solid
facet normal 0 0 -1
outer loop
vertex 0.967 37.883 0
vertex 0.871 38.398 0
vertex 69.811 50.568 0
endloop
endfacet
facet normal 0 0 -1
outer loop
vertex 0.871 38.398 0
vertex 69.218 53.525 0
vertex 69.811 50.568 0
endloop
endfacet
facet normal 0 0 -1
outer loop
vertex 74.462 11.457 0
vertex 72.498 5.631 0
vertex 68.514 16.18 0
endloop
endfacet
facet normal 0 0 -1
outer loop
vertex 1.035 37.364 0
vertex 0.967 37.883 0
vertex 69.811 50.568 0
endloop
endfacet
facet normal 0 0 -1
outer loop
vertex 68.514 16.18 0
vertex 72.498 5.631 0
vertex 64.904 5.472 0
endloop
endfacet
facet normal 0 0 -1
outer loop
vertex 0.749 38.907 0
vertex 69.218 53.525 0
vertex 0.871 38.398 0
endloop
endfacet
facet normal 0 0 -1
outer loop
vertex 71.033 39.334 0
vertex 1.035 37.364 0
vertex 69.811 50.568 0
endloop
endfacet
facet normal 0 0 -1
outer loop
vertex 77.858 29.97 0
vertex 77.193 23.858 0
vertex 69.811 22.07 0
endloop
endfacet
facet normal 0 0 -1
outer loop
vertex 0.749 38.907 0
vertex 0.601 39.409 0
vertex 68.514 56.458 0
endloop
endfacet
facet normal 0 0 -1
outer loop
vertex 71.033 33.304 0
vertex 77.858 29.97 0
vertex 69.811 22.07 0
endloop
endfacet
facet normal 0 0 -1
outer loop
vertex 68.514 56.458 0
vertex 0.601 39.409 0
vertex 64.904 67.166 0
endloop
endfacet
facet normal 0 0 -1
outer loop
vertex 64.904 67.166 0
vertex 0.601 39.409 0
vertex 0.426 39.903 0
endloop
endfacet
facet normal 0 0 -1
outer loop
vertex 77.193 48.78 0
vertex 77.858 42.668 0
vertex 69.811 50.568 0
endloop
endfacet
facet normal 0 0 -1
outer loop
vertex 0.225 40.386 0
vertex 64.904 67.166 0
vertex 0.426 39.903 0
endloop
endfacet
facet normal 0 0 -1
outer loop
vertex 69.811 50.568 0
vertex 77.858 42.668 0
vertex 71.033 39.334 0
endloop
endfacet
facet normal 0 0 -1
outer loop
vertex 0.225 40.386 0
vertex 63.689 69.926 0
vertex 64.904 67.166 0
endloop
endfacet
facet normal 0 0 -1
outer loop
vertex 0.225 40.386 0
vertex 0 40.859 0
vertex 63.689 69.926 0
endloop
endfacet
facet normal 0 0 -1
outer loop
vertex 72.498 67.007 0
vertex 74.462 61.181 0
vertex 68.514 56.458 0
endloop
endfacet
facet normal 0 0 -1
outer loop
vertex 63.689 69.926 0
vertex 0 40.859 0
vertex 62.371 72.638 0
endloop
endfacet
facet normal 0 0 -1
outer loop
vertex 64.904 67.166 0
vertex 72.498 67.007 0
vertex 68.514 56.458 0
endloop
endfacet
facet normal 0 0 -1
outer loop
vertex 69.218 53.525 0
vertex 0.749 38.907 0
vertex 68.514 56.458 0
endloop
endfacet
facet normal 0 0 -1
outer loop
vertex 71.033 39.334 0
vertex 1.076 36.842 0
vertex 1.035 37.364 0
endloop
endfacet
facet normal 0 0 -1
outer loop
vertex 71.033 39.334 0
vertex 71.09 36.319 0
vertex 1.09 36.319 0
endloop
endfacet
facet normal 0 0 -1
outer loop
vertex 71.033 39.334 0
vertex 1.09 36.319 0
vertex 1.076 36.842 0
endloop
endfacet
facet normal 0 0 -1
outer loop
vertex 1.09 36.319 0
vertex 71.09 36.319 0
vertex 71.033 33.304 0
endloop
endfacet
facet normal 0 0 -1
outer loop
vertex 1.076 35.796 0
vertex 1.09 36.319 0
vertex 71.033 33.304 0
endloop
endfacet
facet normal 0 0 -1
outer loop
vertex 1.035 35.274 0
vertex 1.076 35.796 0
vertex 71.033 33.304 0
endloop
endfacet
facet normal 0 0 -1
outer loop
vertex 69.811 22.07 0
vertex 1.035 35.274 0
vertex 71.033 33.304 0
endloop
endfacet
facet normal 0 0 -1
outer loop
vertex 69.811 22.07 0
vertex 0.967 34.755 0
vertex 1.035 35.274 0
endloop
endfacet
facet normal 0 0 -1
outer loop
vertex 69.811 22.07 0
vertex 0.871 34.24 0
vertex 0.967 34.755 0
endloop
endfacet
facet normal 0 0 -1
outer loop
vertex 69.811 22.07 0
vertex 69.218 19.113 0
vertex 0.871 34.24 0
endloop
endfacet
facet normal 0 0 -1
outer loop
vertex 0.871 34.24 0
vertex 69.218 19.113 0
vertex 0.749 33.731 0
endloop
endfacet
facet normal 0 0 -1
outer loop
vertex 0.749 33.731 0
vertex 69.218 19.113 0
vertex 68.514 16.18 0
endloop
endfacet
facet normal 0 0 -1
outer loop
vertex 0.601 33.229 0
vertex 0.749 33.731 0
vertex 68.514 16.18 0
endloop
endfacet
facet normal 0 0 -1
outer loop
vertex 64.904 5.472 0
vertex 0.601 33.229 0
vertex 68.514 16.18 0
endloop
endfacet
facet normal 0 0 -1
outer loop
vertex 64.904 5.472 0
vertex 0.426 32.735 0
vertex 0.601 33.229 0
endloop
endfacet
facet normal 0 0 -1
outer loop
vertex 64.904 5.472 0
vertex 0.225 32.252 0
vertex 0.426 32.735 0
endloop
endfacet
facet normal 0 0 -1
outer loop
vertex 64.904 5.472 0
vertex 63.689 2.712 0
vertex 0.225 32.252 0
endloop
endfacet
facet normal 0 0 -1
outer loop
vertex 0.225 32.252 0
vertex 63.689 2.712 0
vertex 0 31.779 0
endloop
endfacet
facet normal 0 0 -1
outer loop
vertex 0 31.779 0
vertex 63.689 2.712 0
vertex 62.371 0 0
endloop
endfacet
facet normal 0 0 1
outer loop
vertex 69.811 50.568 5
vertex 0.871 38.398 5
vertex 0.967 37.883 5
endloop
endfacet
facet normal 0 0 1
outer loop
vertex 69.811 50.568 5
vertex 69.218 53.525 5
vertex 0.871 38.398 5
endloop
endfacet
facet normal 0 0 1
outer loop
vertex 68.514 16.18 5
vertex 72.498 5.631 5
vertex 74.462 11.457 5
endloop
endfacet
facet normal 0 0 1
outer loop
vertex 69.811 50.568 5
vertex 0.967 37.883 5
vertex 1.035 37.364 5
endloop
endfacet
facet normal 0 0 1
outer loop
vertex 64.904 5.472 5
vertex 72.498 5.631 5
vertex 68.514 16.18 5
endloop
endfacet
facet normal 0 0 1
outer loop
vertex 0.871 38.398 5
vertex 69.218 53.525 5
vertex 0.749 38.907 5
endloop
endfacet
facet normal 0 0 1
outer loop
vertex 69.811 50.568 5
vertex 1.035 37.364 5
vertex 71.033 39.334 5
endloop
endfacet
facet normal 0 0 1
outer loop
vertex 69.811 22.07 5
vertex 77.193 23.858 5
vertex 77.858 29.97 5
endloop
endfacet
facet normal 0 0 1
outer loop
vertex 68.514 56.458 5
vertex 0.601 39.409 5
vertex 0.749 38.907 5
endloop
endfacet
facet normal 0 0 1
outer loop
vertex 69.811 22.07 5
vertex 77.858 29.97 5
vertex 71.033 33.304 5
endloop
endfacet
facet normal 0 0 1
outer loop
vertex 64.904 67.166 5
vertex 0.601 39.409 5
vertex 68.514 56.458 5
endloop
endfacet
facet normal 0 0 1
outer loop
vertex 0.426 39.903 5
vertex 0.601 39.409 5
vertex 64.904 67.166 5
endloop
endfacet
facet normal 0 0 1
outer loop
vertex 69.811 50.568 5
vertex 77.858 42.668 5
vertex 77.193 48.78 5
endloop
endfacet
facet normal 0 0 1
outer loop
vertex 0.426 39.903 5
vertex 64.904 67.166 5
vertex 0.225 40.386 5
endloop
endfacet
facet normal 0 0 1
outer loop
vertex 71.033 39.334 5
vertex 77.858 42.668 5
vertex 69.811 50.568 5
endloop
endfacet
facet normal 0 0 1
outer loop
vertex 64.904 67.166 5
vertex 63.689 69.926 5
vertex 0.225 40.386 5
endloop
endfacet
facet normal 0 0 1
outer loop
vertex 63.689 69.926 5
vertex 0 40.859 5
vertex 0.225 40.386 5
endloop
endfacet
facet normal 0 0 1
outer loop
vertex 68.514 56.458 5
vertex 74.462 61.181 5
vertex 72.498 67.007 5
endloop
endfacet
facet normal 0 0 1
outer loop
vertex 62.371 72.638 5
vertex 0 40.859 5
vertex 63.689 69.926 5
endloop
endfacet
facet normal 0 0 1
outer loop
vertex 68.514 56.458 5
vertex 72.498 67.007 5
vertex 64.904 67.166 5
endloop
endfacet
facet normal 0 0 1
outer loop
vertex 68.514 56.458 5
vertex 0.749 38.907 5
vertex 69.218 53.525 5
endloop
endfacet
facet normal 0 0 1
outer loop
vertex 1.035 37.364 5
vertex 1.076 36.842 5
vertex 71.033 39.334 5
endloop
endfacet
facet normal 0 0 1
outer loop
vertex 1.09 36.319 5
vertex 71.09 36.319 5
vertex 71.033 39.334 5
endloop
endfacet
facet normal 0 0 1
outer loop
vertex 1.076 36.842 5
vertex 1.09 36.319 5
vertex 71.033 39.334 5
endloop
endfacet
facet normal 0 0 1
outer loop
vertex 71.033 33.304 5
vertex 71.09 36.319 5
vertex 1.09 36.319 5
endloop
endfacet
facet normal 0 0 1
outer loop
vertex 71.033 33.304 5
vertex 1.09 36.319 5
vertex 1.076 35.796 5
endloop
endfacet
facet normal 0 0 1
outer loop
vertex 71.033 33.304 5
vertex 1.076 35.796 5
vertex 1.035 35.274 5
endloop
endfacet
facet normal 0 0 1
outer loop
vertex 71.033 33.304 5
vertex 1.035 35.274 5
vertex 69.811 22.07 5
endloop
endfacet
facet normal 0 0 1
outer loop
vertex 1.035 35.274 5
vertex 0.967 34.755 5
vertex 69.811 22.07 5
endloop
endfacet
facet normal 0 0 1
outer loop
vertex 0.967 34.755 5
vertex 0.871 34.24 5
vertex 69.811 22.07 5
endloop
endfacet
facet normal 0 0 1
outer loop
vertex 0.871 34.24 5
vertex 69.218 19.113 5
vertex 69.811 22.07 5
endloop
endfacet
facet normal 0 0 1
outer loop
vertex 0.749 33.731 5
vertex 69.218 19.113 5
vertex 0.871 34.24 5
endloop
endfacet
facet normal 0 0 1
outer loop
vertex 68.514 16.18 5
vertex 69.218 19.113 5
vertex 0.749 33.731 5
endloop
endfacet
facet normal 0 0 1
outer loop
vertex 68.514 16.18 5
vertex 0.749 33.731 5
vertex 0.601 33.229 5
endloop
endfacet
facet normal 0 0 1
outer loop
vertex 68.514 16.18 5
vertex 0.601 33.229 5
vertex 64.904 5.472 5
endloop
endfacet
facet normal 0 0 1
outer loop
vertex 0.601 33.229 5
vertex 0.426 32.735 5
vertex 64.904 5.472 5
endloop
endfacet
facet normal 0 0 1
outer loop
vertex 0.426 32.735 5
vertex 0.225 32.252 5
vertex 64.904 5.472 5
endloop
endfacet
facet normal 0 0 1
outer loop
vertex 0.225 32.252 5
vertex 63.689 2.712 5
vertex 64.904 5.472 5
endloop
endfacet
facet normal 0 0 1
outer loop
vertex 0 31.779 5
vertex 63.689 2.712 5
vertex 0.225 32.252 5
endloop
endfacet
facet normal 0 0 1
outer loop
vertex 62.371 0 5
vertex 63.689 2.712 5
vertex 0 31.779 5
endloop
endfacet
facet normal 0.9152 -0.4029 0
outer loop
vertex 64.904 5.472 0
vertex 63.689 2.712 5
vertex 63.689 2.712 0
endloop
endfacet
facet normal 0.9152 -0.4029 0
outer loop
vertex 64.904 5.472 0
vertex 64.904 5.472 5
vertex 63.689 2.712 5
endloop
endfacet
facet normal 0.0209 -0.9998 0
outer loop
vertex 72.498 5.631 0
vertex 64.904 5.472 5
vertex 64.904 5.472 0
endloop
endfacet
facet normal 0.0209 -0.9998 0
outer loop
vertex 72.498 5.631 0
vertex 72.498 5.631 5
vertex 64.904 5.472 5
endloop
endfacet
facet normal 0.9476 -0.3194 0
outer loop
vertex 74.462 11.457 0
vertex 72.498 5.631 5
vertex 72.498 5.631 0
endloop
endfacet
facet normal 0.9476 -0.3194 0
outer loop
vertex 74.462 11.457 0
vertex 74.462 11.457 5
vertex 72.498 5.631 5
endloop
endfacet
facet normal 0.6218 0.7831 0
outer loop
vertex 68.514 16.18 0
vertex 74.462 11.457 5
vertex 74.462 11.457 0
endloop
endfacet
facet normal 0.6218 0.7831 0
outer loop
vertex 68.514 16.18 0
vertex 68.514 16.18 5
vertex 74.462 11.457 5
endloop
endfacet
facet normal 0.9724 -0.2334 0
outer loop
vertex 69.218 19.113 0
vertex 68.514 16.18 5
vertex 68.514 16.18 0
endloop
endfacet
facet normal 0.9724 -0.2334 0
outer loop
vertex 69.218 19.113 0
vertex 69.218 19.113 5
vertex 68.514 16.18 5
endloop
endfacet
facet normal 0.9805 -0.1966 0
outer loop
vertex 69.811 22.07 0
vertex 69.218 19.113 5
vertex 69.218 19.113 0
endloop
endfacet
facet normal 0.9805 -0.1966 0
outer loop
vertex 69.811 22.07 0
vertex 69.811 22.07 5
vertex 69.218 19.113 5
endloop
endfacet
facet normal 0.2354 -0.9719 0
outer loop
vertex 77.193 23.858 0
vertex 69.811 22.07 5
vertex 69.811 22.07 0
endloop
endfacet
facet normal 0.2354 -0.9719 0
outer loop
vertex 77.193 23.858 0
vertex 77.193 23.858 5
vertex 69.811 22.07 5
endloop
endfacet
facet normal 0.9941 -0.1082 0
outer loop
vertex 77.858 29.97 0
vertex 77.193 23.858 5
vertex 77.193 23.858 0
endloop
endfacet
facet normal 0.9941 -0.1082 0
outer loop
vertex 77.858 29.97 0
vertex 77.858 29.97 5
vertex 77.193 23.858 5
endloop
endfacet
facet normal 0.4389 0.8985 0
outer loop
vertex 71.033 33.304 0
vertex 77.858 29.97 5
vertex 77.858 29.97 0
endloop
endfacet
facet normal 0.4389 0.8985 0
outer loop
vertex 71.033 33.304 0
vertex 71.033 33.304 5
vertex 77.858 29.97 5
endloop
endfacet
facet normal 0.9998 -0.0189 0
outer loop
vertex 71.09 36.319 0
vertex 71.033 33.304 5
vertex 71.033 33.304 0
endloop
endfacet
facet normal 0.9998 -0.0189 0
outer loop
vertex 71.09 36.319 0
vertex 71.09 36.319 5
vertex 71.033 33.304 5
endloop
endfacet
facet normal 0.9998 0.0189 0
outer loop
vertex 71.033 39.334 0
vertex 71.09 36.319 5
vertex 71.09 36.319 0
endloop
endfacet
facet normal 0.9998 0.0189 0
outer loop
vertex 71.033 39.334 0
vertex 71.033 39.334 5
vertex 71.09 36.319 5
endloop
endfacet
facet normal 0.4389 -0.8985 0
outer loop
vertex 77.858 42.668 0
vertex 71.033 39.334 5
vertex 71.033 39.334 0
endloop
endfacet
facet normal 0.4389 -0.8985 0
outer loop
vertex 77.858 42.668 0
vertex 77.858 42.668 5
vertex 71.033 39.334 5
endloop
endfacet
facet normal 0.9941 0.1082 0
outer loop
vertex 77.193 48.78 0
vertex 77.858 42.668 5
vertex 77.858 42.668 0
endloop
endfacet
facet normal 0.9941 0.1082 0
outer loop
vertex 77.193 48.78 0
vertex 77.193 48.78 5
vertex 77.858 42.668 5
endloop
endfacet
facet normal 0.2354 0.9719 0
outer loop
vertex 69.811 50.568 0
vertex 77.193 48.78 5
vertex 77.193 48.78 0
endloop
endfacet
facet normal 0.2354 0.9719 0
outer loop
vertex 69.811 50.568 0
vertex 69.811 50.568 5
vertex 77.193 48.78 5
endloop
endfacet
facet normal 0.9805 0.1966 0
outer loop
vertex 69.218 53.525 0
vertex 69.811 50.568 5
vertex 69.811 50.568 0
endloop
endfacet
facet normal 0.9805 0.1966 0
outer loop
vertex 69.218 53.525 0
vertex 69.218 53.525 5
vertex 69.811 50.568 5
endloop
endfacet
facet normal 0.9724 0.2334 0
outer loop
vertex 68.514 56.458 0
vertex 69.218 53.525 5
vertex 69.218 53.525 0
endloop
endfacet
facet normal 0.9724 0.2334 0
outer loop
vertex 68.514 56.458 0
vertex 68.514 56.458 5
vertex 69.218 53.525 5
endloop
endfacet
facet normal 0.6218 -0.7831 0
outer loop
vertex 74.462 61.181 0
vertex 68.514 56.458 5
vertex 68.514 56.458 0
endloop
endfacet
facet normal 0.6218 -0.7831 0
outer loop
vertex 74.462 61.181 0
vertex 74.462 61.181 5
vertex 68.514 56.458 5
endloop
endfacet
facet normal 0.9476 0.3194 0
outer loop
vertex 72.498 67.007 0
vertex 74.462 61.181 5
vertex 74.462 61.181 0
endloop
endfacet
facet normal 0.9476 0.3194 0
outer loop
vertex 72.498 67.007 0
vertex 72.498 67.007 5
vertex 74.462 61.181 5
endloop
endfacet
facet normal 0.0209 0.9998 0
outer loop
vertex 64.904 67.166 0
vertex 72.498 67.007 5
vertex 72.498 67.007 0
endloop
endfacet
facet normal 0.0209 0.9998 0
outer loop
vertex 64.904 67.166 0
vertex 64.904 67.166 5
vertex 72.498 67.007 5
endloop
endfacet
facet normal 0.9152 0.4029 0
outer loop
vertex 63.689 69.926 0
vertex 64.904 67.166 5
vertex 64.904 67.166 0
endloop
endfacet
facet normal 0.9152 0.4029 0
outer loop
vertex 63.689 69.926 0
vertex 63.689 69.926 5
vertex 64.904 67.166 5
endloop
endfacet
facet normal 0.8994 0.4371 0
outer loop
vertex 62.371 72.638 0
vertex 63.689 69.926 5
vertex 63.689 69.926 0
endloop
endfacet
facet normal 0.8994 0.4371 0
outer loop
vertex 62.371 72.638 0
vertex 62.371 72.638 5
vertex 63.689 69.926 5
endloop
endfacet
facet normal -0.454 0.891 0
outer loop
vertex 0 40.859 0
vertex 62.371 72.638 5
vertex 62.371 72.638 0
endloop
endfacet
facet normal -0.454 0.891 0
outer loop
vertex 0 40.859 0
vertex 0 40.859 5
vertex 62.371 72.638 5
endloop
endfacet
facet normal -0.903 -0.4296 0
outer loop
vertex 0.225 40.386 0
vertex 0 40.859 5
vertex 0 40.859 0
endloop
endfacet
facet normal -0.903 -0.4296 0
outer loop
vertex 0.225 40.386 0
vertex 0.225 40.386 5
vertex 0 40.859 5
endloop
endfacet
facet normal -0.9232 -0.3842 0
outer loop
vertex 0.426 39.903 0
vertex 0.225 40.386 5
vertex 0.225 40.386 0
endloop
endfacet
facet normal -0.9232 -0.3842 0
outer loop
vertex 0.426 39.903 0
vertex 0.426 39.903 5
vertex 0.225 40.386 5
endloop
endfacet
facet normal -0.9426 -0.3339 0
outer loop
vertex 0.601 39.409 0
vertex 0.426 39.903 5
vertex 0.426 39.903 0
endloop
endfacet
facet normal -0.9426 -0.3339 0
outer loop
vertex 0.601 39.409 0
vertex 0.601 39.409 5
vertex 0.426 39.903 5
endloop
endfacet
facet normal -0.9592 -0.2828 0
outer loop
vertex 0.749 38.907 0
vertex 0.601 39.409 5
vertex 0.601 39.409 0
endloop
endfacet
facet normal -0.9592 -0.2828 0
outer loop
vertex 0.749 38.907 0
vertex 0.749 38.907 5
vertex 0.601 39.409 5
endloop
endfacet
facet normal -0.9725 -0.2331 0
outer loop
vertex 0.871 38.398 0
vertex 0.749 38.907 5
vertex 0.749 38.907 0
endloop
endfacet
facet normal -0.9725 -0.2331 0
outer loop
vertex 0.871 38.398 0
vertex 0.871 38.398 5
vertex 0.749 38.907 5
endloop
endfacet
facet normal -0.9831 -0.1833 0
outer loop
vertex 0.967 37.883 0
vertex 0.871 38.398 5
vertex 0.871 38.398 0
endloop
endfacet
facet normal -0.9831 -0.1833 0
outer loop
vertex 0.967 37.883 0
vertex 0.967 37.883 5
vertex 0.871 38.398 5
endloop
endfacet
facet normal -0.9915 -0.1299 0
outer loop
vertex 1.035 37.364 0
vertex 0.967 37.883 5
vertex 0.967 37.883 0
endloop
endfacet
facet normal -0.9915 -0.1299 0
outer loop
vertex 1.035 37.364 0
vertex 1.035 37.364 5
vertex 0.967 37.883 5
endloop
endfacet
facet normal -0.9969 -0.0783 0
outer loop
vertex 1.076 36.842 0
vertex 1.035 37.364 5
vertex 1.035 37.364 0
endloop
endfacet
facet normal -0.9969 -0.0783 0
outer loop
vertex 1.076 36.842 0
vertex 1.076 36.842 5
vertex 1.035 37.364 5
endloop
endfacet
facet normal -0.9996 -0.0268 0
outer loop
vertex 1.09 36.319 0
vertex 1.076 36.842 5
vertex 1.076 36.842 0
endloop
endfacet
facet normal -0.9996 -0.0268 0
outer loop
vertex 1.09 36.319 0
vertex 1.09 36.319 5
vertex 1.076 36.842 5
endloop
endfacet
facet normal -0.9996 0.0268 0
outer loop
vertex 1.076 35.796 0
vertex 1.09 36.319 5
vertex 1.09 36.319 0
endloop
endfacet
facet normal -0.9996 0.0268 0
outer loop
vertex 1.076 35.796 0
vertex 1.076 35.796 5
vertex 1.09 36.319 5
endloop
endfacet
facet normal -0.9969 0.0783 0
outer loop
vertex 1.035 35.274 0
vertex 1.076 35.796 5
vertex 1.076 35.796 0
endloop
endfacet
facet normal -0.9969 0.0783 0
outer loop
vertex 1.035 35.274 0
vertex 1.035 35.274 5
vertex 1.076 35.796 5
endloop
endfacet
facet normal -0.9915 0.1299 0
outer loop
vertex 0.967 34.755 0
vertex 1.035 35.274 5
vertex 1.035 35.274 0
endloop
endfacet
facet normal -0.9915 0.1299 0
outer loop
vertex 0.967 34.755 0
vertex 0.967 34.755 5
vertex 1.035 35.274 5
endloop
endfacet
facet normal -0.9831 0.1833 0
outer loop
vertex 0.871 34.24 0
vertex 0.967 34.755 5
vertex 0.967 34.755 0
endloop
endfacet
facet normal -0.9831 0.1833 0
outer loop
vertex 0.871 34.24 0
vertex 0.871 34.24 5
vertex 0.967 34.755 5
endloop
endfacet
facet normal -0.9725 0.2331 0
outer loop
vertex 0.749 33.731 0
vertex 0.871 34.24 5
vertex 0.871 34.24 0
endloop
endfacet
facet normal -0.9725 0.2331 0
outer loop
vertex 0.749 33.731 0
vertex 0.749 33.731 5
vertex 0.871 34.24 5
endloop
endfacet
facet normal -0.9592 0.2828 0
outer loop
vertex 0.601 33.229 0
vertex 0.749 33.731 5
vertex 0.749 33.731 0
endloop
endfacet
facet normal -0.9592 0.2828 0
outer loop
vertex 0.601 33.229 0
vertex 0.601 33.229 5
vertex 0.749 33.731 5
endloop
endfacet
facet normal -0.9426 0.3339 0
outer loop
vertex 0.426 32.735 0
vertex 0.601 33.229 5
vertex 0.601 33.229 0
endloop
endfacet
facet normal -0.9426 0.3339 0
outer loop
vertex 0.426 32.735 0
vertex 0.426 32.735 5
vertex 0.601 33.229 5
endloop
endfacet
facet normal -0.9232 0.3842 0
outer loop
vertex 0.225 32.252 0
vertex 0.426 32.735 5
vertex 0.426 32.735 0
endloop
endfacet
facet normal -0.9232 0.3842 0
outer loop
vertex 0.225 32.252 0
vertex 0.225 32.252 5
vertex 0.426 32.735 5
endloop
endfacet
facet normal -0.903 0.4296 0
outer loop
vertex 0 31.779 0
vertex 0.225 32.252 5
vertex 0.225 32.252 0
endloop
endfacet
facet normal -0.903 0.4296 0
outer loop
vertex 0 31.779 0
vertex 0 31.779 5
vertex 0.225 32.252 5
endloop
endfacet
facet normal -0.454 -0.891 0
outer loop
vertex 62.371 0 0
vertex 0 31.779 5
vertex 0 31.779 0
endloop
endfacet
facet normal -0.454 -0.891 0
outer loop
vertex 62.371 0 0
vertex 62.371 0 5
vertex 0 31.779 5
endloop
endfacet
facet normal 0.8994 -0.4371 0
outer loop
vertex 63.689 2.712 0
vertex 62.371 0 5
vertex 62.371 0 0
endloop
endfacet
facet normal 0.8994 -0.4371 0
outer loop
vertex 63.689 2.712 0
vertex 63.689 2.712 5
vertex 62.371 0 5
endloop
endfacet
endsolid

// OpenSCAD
$fn = 32;

// ----------------------------------------------------------------------
// Gear sector: 4 teeth on 54 degrees
// ----------------------------------------------------------------------

// --- parameters (mm) ---
sector_angle = 54;        // sector angle, degrees
root_r = 80;              // root circle radius
tooth_h = 7;              // tooth height over the root circle
teeth = 4;                // number of teeth on the sector
hub_r = 10;               // hub bore radius
plate_t = 5;              // sector thickness, Z
arc_step = 3;             // sampling step of the root/hub arcs, degrees

tip_r = root_r + tooth_h;  // tip circle radius

profile = [[62.371, 0], [63.689, 2.712], [64.904, 5.472], [72.498, 5.631], [74.462, 11.457], [68.514, 16.18], [69.218, 19.113], [69.811, 22.07], [77.193, 23.858], [77.858, 29.97], [71.033, 33.304], [71.09, 36.319], [71.033, 39.334], [77.858, 42.668], [77.193, 48.78], [69.811, 50.568], [69.218, 53.525], [68.514, 56.458], [74.462, 61.181], [72.498, 67.007], [64.904, 67.166], [63.689, 69.926], [62.371, 72.638], [0, 40.859], [0.225, 40.386], [0.426, 39.903], [0.601, 39.409], [0.749, 38.907], [0.871, 38.398], [0.967, 37.883], [1.035, 37.364], [1.076, 36.842], [1.09, 36.319], [1.076, 35.796], [1.035, 35.274], [0.967, 34.755], [0.871, 34.24], [0.749, 33.731], [0.601, 33.229], [0.426, 32.735], [0.225, 32.252], [0, 31.779]];  // primary outline, 42 points, counter clockwise

// --- the one profile operation ---
linear_extrude(height = plate_t) polygon(points = profile);
